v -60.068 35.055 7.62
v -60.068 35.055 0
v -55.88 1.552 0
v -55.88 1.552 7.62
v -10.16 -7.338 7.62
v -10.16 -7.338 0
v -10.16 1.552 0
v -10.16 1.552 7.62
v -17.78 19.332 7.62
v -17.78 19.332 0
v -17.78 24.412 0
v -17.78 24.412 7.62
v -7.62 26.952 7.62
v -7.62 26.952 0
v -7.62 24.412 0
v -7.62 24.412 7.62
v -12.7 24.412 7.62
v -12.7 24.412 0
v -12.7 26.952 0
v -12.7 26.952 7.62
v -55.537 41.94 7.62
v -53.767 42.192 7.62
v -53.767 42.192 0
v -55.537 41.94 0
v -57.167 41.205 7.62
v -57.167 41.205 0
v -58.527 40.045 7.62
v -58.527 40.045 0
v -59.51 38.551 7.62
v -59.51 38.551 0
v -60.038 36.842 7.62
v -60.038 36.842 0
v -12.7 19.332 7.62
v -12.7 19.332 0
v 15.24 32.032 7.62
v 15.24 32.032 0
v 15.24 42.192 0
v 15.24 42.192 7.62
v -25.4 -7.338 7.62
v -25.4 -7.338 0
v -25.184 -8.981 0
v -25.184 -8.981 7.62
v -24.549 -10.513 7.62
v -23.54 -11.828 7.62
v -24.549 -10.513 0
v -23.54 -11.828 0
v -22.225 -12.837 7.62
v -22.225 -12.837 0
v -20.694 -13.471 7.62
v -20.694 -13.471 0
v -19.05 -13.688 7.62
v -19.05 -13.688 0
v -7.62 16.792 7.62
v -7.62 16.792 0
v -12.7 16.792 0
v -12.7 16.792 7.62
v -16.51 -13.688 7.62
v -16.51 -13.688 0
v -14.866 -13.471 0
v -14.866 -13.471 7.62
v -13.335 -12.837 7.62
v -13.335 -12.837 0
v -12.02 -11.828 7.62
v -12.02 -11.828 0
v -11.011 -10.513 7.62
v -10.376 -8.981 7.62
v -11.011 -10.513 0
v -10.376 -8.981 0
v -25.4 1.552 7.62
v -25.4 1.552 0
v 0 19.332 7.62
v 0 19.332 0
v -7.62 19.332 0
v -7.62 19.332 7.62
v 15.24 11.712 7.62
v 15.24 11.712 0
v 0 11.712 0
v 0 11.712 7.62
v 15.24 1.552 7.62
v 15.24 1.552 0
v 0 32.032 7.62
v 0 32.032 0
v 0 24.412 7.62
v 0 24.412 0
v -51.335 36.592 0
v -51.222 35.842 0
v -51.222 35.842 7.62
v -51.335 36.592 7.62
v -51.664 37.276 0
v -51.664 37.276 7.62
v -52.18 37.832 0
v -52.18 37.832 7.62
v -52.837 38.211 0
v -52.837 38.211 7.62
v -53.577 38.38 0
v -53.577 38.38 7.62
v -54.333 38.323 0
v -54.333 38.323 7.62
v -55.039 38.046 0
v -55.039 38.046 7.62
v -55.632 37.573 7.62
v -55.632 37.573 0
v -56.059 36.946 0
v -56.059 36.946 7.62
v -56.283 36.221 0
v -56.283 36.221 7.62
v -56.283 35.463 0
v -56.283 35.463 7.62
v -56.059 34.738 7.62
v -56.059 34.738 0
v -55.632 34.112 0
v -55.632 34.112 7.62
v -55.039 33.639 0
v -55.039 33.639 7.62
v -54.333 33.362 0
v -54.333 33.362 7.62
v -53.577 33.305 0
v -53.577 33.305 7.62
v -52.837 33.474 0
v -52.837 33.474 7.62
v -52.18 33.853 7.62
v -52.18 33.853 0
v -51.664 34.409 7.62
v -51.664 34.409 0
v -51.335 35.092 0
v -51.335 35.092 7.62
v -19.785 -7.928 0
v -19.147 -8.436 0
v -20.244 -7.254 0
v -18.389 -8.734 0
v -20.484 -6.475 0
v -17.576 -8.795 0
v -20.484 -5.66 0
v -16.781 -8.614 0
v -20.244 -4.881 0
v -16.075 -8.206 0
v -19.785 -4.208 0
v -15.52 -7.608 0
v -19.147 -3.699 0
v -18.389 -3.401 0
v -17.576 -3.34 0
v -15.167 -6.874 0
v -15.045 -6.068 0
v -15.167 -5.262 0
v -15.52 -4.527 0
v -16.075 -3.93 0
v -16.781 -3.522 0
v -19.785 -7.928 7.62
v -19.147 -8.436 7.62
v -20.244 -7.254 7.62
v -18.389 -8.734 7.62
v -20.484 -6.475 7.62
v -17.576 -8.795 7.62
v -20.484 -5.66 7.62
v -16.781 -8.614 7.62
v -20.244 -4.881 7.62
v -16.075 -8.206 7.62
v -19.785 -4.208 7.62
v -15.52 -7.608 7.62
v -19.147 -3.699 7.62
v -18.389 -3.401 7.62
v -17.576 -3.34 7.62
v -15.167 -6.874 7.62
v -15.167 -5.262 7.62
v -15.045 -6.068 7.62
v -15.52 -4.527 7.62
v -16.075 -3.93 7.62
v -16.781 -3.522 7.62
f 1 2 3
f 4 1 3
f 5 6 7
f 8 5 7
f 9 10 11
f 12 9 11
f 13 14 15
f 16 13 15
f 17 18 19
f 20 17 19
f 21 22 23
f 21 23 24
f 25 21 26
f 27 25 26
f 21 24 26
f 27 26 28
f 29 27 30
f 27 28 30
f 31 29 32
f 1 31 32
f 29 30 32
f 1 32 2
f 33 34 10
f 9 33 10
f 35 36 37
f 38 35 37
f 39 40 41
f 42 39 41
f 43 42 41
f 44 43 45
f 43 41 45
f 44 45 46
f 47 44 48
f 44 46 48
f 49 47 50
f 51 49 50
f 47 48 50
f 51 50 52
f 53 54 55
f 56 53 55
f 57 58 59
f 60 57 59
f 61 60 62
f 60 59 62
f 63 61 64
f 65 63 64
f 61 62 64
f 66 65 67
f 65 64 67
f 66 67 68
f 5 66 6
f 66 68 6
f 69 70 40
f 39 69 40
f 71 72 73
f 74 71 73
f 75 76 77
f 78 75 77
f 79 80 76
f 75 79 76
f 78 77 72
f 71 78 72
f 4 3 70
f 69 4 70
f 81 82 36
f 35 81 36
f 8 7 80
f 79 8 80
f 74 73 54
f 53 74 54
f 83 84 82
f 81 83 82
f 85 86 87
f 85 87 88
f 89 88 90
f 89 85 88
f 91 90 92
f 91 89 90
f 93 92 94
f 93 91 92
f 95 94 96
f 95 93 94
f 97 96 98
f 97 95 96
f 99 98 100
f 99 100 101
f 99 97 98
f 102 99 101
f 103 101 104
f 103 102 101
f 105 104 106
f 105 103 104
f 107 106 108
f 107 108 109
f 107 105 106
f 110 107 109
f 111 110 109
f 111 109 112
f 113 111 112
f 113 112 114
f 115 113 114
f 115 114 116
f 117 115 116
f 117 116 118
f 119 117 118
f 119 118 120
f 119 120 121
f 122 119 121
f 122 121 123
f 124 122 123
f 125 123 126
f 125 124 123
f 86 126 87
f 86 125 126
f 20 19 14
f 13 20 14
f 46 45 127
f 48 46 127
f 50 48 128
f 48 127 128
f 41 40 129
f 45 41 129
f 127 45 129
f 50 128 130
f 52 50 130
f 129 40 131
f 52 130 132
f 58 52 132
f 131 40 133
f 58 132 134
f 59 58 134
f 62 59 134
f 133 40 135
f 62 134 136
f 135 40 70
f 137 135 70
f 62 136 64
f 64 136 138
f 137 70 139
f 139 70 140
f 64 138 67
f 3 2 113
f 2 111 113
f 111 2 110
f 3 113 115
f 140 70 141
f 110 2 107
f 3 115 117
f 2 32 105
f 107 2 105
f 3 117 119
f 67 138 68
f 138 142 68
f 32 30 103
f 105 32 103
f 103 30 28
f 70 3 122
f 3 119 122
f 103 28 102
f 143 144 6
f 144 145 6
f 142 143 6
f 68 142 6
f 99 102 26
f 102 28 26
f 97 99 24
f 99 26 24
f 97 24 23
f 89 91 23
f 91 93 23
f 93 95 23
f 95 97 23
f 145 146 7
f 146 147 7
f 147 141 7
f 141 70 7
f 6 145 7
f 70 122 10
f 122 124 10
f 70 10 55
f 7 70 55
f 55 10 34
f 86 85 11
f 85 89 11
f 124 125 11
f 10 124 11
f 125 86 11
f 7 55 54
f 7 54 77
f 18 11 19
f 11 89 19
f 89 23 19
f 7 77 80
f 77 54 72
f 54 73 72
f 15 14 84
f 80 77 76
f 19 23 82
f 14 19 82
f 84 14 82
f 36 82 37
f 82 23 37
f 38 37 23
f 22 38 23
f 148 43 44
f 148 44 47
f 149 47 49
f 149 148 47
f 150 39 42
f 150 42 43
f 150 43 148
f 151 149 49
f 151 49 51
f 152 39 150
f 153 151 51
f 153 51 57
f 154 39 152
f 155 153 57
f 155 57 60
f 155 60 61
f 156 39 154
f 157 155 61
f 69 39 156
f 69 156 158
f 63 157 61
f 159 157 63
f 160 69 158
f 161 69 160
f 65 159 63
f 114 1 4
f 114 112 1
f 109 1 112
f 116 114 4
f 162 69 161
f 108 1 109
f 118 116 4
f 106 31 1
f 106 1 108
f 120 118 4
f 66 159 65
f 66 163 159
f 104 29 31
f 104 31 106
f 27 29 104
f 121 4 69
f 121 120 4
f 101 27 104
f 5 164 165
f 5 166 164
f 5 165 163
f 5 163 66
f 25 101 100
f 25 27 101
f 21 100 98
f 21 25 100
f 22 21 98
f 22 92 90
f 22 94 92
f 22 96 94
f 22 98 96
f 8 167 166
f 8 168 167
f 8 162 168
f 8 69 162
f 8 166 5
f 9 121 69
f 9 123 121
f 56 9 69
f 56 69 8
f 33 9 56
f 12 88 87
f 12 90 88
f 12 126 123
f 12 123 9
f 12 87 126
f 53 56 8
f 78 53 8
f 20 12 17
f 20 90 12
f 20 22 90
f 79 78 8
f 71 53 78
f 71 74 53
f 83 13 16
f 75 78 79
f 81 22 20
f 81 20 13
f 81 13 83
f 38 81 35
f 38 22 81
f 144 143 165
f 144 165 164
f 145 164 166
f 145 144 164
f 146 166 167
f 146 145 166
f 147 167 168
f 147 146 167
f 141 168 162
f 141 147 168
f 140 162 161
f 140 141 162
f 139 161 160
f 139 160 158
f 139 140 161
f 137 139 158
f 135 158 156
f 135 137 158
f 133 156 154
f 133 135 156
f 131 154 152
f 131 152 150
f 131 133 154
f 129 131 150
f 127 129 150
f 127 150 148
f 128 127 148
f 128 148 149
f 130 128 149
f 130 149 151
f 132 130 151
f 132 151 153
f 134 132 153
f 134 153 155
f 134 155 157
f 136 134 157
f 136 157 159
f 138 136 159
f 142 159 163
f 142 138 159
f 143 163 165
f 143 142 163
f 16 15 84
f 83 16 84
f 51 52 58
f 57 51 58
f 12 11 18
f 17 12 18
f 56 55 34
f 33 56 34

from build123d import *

# Parameters (mm, degrees)
F0_R     = 2.734931
F0_R_2   = 2.544482
F1_DEPTH = 7.62


with BuildPart() as f1:
    # F0 (on Top) → F1 (new body)
    with BuildSketch(Plane.XY):
        with BuildLine():
            Line((15.24, 42.192222), (-53.766833, 42.192222))
            ThreePointArc((-53.766833, 42.192222), (-58.527289, 40.044669), (-60.067797, 35.054602))
            Line((-60.067797, 35.054602), (-55.88, 1.552223))
            Line((-55.88, 1.552223), (-25.4, 1.552223))
            Line((-25.4, 1.552223), (-25.4, -7.337777))
            ThreePointArc((-25.4, -7.337777), (-23.540128, -11.827905), (-19.05, -13.687777))
            Line((-19.05, -13.687777), (-16.51, -13.687777))
            ThreePointArc((-16.51, -13.687777), (-12.019872, -11.827905), (-10.16, -7.337777))
            Line((-10.16, -7.337777), (-10.16, 1.552223))
            Line((-10.16, 1.552223), (15.24, 1.552223))
            Line((15.24, 1.552223), (15.24, 11.712223))
            Line((15.24, 11.712223), (0, 11.712223))
            Line((0, 11.712223), (0, 19.332223))
            Line((0, 19.332223), (-7.62, 19.332223))
            Line((-7.62, 19.332223), (-7.62, 16.792223))
            Line((-7.62, 16.792223), (-12.7, 16.792223))
            Line((-12.7, 16.792223), (-12.7, 19.332223))
            Line((-12.7, 19.332223), (-17.78, 19.332223))
            Line((-17.78, 19.332223), (-17.78, 24.412223))
            Line((-17.78, 24.412223), (-12.7, 24.412223))
            Line((-12.7, 24.412223), (-12.7, 26.952223))
            Line((-12.7, 26.952223), (-7.62, 26.952223))
            Line((-7.62, 26.952223), (-7.62, 24.412223))
            Line((-7.62, 24.412223), (0, 24.412223))
            Line((0, 24.412223), (0, 32.032222))
            Line((0, 32.032222), (15.24, 32.032222))
            Line((15.24, 32.032222), (15.24, 42.192222))
        make_face()
        with Locations((-17.78, -6.067777)):
            Circle(F0_R, mode=Mode.SUBTRACT)
        with Locations((-53.766833, 35.842222)):
            Circle(F0_R_2, mode=Mode.SUBTRACT)
    extrude(amount=F1_DEPTH)


solid = f1.part
